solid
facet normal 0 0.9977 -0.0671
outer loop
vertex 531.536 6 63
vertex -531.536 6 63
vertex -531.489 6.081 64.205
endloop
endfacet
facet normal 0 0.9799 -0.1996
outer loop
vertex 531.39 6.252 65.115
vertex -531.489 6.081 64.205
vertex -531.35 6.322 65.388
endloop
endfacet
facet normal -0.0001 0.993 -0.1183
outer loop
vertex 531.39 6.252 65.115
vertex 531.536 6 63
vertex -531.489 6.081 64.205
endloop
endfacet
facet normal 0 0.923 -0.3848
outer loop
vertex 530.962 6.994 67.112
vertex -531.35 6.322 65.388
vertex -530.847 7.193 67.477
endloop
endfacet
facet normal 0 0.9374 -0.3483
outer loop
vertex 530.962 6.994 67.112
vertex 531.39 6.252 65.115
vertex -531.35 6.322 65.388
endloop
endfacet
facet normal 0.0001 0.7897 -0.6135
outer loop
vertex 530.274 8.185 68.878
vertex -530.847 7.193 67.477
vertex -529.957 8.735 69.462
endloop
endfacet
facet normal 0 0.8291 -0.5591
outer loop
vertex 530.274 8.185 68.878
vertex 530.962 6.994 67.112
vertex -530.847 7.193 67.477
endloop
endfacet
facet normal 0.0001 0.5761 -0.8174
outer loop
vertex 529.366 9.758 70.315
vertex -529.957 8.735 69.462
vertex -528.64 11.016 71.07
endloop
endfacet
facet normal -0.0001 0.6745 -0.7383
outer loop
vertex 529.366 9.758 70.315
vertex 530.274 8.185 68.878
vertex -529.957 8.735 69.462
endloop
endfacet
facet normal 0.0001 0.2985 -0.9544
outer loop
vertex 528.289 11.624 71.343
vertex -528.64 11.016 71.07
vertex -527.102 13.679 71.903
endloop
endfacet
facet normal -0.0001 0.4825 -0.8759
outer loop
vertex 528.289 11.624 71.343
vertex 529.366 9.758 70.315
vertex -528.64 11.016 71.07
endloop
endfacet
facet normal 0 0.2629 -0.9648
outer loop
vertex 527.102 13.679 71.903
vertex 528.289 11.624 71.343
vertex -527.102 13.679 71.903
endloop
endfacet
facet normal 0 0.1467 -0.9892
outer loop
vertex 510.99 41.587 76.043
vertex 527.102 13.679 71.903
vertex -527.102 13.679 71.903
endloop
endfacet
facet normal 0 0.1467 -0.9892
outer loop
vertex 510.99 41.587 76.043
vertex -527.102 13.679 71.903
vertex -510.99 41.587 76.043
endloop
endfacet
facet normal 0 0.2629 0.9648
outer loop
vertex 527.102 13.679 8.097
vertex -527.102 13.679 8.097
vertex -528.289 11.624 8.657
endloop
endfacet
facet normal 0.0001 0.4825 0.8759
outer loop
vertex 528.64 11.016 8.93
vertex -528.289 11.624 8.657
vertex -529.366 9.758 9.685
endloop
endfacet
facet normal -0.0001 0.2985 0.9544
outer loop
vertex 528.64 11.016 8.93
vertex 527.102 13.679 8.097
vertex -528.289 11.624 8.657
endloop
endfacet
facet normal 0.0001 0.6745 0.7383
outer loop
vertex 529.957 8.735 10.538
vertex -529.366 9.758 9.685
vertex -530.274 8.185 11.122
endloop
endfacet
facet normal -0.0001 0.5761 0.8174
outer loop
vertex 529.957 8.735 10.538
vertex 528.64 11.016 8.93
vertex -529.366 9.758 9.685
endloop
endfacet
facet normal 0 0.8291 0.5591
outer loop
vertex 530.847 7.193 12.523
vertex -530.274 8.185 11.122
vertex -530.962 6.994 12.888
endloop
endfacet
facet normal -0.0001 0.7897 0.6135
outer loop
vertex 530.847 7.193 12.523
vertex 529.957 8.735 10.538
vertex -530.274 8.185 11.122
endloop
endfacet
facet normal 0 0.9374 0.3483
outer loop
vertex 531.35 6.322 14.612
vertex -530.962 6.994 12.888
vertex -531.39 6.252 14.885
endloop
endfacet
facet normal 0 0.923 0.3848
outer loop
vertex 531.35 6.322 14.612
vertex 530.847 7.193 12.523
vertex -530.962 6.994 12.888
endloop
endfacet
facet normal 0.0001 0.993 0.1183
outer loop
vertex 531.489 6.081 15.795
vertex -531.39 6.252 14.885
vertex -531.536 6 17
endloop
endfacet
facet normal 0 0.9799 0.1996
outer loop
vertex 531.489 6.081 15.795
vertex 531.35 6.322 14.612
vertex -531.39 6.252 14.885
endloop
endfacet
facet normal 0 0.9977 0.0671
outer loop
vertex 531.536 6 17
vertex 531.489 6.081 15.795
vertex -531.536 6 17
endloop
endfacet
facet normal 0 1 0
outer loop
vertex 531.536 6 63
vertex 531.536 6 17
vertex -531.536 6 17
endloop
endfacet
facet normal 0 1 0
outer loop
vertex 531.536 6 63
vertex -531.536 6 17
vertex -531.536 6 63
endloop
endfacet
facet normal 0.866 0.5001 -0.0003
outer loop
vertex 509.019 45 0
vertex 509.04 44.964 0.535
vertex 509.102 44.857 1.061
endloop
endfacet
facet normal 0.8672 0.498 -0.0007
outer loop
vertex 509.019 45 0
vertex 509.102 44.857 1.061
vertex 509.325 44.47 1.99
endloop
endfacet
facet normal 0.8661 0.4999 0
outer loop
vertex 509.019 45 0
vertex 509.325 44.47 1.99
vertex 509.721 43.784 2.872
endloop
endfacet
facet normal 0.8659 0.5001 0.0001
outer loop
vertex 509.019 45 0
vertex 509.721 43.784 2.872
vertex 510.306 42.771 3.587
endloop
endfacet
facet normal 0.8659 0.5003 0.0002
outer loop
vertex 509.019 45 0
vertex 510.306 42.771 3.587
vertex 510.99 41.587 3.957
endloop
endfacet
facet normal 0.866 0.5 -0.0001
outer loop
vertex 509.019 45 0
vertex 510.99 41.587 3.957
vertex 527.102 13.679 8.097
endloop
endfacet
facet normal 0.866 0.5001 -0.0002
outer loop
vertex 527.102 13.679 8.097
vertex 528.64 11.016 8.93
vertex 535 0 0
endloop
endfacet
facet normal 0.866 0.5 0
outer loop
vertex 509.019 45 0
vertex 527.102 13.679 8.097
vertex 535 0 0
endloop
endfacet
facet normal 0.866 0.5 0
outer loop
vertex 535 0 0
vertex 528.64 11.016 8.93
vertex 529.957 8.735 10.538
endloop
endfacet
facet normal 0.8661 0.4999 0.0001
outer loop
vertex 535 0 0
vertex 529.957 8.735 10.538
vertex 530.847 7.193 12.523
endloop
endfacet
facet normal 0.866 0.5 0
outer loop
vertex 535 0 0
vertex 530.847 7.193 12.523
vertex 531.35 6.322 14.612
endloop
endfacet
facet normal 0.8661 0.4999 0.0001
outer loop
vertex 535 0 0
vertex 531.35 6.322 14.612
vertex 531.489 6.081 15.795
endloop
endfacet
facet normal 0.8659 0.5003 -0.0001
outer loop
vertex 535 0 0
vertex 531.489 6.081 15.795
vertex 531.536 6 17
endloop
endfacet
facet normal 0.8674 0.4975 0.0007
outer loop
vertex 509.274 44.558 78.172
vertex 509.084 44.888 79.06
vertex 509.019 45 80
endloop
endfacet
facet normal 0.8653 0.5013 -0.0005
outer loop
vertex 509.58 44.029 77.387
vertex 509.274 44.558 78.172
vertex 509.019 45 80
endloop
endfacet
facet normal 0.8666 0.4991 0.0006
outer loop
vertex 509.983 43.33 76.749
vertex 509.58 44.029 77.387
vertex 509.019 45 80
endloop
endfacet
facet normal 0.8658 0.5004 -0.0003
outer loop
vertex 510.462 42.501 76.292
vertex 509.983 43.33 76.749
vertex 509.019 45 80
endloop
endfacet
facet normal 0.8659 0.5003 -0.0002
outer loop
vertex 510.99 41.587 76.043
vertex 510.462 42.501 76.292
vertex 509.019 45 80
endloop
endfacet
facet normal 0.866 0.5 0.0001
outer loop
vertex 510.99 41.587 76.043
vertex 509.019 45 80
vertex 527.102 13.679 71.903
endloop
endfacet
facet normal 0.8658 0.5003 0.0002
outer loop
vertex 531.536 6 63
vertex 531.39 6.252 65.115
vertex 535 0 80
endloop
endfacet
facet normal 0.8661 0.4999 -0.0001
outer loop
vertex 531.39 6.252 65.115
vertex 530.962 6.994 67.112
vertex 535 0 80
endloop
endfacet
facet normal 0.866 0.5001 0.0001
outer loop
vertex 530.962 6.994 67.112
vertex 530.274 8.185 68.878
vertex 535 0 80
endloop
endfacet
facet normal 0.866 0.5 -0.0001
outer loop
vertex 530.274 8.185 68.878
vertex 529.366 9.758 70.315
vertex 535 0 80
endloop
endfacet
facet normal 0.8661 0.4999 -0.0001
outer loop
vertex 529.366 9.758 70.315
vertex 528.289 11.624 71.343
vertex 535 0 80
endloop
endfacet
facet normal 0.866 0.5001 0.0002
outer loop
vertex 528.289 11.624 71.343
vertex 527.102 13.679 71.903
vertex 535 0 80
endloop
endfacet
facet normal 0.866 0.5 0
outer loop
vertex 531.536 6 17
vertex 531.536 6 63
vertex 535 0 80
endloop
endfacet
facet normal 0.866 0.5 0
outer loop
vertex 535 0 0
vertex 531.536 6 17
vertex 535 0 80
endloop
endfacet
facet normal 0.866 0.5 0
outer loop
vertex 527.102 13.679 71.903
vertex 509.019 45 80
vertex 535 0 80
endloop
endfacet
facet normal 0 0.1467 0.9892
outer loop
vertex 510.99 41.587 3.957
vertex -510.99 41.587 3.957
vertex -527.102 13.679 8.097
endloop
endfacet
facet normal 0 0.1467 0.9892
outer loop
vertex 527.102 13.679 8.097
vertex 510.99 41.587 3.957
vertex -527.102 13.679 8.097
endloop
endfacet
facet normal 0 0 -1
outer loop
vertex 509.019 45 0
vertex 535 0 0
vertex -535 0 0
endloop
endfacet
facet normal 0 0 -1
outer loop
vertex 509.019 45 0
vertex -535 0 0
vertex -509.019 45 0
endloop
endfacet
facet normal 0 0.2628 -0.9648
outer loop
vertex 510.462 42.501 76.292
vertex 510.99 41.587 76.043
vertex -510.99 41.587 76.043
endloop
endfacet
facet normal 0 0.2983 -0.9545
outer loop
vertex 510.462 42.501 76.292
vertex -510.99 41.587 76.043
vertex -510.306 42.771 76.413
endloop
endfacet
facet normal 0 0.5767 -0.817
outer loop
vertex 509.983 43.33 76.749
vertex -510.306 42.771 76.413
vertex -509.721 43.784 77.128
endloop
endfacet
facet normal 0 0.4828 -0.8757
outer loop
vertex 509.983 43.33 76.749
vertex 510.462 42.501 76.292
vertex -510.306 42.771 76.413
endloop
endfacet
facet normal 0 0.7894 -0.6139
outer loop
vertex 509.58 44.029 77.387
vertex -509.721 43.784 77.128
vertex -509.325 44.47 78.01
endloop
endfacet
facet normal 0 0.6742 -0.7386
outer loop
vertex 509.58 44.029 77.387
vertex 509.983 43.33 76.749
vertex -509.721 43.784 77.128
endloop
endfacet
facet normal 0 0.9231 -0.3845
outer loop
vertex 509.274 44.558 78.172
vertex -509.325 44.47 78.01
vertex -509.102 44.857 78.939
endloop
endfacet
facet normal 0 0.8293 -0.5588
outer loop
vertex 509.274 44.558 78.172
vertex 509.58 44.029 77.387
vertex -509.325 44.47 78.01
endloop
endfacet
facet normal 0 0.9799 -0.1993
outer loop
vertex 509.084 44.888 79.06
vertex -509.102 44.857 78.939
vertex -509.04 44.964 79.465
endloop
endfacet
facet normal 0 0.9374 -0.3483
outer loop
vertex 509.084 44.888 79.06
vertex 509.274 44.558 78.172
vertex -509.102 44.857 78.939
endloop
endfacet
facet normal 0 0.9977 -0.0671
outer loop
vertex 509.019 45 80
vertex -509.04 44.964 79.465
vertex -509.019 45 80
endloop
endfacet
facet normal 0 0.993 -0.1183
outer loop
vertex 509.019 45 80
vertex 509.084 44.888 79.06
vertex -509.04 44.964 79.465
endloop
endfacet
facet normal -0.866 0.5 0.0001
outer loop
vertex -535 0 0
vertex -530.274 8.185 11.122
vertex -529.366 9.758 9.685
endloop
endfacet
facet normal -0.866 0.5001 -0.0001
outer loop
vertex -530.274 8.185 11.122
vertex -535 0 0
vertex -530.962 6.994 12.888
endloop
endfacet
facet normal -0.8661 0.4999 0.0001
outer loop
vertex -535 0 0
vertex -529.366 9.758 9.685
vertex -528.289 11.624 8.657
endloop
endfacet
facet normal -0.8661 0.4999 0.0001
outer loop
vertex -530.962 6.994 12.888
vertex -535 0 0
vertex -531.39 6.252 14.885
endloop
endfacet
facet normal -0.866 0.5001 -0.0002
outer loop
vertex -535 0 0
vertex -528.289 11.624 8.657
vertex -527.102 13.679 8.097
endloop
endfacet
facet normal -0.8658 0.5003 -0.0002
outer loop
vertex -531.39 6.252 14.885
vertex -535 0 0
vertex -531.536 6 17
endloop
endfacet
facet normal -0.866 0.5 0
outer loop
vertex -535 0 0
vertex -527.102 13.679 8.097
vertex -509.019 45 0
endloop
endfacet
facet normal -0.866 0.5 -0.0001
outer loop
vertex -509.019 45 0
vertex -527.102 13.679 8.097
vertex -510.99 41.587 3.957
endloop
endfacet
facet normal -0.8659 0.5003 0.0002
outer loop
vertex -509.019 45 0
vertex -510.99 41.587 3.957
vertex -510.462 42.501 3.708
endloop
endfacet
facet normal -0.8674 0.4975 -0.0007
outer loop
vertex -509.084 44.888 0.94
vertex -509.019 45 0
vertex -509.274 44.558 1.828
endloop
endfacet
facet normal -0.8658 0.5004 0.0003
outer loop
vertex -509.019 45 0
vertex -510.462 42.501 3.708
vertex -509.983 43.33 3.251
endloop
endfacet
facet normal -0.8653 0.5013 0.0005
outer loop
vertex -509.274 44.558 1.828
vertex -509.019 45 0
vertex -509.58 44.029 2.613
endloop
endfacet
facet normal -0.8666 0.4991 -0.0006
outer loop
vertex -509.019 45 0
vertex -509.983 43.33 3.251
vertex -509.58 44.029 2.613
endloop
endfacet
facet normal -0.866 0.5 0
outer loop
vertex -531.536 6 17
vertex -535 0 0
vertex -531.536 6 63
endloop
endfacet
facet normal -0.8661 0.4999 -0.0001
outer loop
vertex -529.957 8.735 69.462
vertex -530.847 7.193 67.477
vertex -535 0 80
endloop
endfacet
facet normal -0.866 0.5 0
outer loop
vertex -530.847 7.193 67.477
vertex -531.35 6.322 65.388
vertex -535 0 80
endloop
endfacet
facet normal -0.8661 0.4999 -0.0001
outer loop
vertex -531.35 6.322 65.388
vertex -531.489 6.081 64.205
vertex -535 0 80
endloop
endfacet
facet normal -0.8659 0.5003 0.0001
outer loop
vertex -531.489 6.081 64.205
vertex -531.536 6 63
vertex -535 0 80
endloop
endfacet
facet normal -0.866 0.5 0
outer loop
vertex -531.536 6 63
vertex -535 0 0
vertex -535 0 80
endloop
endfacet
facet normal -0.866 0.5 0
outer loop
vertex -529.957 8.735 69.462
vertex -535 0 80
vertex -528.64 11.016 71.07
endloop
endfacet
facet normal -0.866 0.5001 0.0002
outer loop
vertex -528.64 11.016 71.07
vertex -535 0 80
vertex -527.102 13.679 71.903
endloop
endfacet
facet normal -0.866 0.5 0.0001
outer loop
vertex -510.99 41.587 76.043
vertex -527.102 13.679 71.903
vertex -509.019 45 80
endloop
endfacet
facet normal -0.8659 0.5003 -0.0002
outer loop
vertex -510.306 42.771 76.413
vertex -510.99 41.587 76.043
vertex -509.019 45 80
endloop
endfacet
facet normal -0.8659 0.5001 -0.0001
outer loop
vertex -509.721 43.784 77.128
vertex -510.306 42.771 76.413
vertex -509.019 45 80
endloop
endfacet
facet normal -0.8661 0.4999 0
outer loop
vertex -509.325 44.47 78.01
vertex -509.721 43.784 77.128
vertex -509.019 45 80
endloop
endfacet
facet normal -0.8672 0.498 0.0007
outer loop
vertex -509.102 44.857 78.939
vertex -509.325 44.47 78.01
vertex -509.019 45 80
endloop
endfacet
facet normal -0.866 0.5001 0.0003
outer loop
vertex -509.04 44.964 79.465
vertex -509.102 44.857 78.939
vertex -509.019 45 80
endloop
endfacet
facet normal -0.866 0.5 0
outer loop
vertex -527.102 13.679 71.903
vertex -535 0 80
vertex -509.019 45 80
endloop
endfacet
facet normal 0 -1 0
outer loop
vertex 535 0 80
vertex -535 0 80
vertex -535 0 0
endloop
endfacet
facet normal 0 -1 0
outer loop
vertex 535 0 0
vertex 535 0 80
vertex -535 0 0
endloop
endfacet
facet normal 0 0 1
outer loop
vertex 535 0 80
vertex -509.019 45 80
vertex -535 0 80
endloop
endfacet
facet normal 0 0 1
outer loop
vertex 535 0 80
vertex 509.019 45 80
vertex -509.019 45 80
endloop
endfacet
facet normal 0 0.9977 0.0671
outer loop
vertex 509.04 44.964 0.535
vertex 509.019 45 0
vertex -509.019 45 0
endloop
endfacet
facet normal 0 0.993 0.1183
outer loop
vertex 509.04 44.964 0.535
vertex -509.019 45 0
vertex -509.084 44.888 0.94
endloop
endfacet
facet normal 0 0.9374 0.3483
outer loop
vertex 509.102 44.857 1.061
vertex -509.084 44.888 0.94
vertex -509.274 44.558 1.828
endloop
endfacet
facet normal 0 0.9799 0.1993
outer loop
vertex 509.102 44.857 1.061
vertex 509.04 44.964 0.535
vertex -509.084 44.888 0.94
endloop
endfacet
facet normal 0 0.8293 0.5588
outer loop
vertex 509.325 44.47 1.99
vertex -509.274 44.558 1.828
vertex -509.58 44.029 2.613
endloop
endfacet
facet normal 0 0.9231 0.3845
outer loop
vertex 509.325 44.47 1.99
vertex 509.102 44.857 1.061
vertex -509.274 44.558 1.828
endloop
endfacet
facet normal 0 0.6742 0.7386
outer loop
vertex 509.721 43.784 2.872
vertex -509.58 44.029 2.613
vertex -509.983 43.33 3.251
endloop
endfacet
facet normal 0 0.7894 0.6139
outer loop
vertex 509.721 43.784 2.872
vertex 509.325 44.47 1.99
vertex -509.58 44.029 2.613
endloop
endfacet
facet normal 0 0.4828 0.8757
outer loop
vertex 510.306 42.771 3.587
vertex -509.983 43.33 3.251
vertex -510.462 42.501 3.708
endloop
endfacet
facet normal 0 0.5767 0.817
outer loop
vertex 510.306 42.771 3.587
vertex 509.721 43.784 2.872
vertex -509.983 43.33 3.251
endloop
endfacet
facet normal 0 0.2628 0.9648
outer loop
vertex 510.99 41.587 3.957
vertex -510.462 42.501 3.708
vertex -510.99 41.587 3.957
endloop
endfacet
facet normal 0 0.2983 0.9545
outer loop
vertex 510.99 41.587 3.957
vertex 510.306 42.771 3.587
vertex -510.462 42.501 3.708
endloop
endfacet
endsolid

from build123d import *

# Parameters (mm, degrees)
F2_DEPTH = 535
F4_DEPTH = 80


with BuildPart() as f2:
    # F1 (on Right) → F2 (new body, symmetric)
    with BuildSketch(Plane.YZ):
        with BuildLine():
            Line((0, 80), (0, 40))
            Line((0, 40), (6, 40))
            Line((6, 40), (6, 63))
            ThreePointArc((6, 63), (8.185015, 68.878434), (13.679108, 71.902541))
            Line((13.679108, 71.902541), (41.587063, 76.043315))
            ThreePointArc((41.587063, 76.043315), (44.028882, 77.387363), (45, 80))
            Line((45, 80), (0, 80))
        make_face()
        with BuildLine():
            Line((6, 40), (0, 40))
            Line((0, 40), (0, 0))
            Line((0, 0), (45, 0))
            ThreePointArc((45, 0), (44.028882, 2.612637), (41.587063, 3.956685))
            Line((41.587063, 3.956685), (13.679108, 8.097459))
            ThreePointArc((13.679108, 8.097459), (8.185015, 11.121566), (6, 17))
            Line((6, 17), (6, 40))
        make_face()
    extrude(amount=F2_DEPTH, both=True)

    # F3 (on face) → F4 (cut, through all)
    with BuildSketch(Plane.XY.offset(80)):
        Polygon((-535, 45), (-535, 0), (-509.019238, 45), align=None)
        Polygon((535, 45), (509.019238, 45), (535, 0), align=None)
    extrude(amount=-F4_DEPTH, mode=Mode.SUBTRACT)


solid = f2.part
